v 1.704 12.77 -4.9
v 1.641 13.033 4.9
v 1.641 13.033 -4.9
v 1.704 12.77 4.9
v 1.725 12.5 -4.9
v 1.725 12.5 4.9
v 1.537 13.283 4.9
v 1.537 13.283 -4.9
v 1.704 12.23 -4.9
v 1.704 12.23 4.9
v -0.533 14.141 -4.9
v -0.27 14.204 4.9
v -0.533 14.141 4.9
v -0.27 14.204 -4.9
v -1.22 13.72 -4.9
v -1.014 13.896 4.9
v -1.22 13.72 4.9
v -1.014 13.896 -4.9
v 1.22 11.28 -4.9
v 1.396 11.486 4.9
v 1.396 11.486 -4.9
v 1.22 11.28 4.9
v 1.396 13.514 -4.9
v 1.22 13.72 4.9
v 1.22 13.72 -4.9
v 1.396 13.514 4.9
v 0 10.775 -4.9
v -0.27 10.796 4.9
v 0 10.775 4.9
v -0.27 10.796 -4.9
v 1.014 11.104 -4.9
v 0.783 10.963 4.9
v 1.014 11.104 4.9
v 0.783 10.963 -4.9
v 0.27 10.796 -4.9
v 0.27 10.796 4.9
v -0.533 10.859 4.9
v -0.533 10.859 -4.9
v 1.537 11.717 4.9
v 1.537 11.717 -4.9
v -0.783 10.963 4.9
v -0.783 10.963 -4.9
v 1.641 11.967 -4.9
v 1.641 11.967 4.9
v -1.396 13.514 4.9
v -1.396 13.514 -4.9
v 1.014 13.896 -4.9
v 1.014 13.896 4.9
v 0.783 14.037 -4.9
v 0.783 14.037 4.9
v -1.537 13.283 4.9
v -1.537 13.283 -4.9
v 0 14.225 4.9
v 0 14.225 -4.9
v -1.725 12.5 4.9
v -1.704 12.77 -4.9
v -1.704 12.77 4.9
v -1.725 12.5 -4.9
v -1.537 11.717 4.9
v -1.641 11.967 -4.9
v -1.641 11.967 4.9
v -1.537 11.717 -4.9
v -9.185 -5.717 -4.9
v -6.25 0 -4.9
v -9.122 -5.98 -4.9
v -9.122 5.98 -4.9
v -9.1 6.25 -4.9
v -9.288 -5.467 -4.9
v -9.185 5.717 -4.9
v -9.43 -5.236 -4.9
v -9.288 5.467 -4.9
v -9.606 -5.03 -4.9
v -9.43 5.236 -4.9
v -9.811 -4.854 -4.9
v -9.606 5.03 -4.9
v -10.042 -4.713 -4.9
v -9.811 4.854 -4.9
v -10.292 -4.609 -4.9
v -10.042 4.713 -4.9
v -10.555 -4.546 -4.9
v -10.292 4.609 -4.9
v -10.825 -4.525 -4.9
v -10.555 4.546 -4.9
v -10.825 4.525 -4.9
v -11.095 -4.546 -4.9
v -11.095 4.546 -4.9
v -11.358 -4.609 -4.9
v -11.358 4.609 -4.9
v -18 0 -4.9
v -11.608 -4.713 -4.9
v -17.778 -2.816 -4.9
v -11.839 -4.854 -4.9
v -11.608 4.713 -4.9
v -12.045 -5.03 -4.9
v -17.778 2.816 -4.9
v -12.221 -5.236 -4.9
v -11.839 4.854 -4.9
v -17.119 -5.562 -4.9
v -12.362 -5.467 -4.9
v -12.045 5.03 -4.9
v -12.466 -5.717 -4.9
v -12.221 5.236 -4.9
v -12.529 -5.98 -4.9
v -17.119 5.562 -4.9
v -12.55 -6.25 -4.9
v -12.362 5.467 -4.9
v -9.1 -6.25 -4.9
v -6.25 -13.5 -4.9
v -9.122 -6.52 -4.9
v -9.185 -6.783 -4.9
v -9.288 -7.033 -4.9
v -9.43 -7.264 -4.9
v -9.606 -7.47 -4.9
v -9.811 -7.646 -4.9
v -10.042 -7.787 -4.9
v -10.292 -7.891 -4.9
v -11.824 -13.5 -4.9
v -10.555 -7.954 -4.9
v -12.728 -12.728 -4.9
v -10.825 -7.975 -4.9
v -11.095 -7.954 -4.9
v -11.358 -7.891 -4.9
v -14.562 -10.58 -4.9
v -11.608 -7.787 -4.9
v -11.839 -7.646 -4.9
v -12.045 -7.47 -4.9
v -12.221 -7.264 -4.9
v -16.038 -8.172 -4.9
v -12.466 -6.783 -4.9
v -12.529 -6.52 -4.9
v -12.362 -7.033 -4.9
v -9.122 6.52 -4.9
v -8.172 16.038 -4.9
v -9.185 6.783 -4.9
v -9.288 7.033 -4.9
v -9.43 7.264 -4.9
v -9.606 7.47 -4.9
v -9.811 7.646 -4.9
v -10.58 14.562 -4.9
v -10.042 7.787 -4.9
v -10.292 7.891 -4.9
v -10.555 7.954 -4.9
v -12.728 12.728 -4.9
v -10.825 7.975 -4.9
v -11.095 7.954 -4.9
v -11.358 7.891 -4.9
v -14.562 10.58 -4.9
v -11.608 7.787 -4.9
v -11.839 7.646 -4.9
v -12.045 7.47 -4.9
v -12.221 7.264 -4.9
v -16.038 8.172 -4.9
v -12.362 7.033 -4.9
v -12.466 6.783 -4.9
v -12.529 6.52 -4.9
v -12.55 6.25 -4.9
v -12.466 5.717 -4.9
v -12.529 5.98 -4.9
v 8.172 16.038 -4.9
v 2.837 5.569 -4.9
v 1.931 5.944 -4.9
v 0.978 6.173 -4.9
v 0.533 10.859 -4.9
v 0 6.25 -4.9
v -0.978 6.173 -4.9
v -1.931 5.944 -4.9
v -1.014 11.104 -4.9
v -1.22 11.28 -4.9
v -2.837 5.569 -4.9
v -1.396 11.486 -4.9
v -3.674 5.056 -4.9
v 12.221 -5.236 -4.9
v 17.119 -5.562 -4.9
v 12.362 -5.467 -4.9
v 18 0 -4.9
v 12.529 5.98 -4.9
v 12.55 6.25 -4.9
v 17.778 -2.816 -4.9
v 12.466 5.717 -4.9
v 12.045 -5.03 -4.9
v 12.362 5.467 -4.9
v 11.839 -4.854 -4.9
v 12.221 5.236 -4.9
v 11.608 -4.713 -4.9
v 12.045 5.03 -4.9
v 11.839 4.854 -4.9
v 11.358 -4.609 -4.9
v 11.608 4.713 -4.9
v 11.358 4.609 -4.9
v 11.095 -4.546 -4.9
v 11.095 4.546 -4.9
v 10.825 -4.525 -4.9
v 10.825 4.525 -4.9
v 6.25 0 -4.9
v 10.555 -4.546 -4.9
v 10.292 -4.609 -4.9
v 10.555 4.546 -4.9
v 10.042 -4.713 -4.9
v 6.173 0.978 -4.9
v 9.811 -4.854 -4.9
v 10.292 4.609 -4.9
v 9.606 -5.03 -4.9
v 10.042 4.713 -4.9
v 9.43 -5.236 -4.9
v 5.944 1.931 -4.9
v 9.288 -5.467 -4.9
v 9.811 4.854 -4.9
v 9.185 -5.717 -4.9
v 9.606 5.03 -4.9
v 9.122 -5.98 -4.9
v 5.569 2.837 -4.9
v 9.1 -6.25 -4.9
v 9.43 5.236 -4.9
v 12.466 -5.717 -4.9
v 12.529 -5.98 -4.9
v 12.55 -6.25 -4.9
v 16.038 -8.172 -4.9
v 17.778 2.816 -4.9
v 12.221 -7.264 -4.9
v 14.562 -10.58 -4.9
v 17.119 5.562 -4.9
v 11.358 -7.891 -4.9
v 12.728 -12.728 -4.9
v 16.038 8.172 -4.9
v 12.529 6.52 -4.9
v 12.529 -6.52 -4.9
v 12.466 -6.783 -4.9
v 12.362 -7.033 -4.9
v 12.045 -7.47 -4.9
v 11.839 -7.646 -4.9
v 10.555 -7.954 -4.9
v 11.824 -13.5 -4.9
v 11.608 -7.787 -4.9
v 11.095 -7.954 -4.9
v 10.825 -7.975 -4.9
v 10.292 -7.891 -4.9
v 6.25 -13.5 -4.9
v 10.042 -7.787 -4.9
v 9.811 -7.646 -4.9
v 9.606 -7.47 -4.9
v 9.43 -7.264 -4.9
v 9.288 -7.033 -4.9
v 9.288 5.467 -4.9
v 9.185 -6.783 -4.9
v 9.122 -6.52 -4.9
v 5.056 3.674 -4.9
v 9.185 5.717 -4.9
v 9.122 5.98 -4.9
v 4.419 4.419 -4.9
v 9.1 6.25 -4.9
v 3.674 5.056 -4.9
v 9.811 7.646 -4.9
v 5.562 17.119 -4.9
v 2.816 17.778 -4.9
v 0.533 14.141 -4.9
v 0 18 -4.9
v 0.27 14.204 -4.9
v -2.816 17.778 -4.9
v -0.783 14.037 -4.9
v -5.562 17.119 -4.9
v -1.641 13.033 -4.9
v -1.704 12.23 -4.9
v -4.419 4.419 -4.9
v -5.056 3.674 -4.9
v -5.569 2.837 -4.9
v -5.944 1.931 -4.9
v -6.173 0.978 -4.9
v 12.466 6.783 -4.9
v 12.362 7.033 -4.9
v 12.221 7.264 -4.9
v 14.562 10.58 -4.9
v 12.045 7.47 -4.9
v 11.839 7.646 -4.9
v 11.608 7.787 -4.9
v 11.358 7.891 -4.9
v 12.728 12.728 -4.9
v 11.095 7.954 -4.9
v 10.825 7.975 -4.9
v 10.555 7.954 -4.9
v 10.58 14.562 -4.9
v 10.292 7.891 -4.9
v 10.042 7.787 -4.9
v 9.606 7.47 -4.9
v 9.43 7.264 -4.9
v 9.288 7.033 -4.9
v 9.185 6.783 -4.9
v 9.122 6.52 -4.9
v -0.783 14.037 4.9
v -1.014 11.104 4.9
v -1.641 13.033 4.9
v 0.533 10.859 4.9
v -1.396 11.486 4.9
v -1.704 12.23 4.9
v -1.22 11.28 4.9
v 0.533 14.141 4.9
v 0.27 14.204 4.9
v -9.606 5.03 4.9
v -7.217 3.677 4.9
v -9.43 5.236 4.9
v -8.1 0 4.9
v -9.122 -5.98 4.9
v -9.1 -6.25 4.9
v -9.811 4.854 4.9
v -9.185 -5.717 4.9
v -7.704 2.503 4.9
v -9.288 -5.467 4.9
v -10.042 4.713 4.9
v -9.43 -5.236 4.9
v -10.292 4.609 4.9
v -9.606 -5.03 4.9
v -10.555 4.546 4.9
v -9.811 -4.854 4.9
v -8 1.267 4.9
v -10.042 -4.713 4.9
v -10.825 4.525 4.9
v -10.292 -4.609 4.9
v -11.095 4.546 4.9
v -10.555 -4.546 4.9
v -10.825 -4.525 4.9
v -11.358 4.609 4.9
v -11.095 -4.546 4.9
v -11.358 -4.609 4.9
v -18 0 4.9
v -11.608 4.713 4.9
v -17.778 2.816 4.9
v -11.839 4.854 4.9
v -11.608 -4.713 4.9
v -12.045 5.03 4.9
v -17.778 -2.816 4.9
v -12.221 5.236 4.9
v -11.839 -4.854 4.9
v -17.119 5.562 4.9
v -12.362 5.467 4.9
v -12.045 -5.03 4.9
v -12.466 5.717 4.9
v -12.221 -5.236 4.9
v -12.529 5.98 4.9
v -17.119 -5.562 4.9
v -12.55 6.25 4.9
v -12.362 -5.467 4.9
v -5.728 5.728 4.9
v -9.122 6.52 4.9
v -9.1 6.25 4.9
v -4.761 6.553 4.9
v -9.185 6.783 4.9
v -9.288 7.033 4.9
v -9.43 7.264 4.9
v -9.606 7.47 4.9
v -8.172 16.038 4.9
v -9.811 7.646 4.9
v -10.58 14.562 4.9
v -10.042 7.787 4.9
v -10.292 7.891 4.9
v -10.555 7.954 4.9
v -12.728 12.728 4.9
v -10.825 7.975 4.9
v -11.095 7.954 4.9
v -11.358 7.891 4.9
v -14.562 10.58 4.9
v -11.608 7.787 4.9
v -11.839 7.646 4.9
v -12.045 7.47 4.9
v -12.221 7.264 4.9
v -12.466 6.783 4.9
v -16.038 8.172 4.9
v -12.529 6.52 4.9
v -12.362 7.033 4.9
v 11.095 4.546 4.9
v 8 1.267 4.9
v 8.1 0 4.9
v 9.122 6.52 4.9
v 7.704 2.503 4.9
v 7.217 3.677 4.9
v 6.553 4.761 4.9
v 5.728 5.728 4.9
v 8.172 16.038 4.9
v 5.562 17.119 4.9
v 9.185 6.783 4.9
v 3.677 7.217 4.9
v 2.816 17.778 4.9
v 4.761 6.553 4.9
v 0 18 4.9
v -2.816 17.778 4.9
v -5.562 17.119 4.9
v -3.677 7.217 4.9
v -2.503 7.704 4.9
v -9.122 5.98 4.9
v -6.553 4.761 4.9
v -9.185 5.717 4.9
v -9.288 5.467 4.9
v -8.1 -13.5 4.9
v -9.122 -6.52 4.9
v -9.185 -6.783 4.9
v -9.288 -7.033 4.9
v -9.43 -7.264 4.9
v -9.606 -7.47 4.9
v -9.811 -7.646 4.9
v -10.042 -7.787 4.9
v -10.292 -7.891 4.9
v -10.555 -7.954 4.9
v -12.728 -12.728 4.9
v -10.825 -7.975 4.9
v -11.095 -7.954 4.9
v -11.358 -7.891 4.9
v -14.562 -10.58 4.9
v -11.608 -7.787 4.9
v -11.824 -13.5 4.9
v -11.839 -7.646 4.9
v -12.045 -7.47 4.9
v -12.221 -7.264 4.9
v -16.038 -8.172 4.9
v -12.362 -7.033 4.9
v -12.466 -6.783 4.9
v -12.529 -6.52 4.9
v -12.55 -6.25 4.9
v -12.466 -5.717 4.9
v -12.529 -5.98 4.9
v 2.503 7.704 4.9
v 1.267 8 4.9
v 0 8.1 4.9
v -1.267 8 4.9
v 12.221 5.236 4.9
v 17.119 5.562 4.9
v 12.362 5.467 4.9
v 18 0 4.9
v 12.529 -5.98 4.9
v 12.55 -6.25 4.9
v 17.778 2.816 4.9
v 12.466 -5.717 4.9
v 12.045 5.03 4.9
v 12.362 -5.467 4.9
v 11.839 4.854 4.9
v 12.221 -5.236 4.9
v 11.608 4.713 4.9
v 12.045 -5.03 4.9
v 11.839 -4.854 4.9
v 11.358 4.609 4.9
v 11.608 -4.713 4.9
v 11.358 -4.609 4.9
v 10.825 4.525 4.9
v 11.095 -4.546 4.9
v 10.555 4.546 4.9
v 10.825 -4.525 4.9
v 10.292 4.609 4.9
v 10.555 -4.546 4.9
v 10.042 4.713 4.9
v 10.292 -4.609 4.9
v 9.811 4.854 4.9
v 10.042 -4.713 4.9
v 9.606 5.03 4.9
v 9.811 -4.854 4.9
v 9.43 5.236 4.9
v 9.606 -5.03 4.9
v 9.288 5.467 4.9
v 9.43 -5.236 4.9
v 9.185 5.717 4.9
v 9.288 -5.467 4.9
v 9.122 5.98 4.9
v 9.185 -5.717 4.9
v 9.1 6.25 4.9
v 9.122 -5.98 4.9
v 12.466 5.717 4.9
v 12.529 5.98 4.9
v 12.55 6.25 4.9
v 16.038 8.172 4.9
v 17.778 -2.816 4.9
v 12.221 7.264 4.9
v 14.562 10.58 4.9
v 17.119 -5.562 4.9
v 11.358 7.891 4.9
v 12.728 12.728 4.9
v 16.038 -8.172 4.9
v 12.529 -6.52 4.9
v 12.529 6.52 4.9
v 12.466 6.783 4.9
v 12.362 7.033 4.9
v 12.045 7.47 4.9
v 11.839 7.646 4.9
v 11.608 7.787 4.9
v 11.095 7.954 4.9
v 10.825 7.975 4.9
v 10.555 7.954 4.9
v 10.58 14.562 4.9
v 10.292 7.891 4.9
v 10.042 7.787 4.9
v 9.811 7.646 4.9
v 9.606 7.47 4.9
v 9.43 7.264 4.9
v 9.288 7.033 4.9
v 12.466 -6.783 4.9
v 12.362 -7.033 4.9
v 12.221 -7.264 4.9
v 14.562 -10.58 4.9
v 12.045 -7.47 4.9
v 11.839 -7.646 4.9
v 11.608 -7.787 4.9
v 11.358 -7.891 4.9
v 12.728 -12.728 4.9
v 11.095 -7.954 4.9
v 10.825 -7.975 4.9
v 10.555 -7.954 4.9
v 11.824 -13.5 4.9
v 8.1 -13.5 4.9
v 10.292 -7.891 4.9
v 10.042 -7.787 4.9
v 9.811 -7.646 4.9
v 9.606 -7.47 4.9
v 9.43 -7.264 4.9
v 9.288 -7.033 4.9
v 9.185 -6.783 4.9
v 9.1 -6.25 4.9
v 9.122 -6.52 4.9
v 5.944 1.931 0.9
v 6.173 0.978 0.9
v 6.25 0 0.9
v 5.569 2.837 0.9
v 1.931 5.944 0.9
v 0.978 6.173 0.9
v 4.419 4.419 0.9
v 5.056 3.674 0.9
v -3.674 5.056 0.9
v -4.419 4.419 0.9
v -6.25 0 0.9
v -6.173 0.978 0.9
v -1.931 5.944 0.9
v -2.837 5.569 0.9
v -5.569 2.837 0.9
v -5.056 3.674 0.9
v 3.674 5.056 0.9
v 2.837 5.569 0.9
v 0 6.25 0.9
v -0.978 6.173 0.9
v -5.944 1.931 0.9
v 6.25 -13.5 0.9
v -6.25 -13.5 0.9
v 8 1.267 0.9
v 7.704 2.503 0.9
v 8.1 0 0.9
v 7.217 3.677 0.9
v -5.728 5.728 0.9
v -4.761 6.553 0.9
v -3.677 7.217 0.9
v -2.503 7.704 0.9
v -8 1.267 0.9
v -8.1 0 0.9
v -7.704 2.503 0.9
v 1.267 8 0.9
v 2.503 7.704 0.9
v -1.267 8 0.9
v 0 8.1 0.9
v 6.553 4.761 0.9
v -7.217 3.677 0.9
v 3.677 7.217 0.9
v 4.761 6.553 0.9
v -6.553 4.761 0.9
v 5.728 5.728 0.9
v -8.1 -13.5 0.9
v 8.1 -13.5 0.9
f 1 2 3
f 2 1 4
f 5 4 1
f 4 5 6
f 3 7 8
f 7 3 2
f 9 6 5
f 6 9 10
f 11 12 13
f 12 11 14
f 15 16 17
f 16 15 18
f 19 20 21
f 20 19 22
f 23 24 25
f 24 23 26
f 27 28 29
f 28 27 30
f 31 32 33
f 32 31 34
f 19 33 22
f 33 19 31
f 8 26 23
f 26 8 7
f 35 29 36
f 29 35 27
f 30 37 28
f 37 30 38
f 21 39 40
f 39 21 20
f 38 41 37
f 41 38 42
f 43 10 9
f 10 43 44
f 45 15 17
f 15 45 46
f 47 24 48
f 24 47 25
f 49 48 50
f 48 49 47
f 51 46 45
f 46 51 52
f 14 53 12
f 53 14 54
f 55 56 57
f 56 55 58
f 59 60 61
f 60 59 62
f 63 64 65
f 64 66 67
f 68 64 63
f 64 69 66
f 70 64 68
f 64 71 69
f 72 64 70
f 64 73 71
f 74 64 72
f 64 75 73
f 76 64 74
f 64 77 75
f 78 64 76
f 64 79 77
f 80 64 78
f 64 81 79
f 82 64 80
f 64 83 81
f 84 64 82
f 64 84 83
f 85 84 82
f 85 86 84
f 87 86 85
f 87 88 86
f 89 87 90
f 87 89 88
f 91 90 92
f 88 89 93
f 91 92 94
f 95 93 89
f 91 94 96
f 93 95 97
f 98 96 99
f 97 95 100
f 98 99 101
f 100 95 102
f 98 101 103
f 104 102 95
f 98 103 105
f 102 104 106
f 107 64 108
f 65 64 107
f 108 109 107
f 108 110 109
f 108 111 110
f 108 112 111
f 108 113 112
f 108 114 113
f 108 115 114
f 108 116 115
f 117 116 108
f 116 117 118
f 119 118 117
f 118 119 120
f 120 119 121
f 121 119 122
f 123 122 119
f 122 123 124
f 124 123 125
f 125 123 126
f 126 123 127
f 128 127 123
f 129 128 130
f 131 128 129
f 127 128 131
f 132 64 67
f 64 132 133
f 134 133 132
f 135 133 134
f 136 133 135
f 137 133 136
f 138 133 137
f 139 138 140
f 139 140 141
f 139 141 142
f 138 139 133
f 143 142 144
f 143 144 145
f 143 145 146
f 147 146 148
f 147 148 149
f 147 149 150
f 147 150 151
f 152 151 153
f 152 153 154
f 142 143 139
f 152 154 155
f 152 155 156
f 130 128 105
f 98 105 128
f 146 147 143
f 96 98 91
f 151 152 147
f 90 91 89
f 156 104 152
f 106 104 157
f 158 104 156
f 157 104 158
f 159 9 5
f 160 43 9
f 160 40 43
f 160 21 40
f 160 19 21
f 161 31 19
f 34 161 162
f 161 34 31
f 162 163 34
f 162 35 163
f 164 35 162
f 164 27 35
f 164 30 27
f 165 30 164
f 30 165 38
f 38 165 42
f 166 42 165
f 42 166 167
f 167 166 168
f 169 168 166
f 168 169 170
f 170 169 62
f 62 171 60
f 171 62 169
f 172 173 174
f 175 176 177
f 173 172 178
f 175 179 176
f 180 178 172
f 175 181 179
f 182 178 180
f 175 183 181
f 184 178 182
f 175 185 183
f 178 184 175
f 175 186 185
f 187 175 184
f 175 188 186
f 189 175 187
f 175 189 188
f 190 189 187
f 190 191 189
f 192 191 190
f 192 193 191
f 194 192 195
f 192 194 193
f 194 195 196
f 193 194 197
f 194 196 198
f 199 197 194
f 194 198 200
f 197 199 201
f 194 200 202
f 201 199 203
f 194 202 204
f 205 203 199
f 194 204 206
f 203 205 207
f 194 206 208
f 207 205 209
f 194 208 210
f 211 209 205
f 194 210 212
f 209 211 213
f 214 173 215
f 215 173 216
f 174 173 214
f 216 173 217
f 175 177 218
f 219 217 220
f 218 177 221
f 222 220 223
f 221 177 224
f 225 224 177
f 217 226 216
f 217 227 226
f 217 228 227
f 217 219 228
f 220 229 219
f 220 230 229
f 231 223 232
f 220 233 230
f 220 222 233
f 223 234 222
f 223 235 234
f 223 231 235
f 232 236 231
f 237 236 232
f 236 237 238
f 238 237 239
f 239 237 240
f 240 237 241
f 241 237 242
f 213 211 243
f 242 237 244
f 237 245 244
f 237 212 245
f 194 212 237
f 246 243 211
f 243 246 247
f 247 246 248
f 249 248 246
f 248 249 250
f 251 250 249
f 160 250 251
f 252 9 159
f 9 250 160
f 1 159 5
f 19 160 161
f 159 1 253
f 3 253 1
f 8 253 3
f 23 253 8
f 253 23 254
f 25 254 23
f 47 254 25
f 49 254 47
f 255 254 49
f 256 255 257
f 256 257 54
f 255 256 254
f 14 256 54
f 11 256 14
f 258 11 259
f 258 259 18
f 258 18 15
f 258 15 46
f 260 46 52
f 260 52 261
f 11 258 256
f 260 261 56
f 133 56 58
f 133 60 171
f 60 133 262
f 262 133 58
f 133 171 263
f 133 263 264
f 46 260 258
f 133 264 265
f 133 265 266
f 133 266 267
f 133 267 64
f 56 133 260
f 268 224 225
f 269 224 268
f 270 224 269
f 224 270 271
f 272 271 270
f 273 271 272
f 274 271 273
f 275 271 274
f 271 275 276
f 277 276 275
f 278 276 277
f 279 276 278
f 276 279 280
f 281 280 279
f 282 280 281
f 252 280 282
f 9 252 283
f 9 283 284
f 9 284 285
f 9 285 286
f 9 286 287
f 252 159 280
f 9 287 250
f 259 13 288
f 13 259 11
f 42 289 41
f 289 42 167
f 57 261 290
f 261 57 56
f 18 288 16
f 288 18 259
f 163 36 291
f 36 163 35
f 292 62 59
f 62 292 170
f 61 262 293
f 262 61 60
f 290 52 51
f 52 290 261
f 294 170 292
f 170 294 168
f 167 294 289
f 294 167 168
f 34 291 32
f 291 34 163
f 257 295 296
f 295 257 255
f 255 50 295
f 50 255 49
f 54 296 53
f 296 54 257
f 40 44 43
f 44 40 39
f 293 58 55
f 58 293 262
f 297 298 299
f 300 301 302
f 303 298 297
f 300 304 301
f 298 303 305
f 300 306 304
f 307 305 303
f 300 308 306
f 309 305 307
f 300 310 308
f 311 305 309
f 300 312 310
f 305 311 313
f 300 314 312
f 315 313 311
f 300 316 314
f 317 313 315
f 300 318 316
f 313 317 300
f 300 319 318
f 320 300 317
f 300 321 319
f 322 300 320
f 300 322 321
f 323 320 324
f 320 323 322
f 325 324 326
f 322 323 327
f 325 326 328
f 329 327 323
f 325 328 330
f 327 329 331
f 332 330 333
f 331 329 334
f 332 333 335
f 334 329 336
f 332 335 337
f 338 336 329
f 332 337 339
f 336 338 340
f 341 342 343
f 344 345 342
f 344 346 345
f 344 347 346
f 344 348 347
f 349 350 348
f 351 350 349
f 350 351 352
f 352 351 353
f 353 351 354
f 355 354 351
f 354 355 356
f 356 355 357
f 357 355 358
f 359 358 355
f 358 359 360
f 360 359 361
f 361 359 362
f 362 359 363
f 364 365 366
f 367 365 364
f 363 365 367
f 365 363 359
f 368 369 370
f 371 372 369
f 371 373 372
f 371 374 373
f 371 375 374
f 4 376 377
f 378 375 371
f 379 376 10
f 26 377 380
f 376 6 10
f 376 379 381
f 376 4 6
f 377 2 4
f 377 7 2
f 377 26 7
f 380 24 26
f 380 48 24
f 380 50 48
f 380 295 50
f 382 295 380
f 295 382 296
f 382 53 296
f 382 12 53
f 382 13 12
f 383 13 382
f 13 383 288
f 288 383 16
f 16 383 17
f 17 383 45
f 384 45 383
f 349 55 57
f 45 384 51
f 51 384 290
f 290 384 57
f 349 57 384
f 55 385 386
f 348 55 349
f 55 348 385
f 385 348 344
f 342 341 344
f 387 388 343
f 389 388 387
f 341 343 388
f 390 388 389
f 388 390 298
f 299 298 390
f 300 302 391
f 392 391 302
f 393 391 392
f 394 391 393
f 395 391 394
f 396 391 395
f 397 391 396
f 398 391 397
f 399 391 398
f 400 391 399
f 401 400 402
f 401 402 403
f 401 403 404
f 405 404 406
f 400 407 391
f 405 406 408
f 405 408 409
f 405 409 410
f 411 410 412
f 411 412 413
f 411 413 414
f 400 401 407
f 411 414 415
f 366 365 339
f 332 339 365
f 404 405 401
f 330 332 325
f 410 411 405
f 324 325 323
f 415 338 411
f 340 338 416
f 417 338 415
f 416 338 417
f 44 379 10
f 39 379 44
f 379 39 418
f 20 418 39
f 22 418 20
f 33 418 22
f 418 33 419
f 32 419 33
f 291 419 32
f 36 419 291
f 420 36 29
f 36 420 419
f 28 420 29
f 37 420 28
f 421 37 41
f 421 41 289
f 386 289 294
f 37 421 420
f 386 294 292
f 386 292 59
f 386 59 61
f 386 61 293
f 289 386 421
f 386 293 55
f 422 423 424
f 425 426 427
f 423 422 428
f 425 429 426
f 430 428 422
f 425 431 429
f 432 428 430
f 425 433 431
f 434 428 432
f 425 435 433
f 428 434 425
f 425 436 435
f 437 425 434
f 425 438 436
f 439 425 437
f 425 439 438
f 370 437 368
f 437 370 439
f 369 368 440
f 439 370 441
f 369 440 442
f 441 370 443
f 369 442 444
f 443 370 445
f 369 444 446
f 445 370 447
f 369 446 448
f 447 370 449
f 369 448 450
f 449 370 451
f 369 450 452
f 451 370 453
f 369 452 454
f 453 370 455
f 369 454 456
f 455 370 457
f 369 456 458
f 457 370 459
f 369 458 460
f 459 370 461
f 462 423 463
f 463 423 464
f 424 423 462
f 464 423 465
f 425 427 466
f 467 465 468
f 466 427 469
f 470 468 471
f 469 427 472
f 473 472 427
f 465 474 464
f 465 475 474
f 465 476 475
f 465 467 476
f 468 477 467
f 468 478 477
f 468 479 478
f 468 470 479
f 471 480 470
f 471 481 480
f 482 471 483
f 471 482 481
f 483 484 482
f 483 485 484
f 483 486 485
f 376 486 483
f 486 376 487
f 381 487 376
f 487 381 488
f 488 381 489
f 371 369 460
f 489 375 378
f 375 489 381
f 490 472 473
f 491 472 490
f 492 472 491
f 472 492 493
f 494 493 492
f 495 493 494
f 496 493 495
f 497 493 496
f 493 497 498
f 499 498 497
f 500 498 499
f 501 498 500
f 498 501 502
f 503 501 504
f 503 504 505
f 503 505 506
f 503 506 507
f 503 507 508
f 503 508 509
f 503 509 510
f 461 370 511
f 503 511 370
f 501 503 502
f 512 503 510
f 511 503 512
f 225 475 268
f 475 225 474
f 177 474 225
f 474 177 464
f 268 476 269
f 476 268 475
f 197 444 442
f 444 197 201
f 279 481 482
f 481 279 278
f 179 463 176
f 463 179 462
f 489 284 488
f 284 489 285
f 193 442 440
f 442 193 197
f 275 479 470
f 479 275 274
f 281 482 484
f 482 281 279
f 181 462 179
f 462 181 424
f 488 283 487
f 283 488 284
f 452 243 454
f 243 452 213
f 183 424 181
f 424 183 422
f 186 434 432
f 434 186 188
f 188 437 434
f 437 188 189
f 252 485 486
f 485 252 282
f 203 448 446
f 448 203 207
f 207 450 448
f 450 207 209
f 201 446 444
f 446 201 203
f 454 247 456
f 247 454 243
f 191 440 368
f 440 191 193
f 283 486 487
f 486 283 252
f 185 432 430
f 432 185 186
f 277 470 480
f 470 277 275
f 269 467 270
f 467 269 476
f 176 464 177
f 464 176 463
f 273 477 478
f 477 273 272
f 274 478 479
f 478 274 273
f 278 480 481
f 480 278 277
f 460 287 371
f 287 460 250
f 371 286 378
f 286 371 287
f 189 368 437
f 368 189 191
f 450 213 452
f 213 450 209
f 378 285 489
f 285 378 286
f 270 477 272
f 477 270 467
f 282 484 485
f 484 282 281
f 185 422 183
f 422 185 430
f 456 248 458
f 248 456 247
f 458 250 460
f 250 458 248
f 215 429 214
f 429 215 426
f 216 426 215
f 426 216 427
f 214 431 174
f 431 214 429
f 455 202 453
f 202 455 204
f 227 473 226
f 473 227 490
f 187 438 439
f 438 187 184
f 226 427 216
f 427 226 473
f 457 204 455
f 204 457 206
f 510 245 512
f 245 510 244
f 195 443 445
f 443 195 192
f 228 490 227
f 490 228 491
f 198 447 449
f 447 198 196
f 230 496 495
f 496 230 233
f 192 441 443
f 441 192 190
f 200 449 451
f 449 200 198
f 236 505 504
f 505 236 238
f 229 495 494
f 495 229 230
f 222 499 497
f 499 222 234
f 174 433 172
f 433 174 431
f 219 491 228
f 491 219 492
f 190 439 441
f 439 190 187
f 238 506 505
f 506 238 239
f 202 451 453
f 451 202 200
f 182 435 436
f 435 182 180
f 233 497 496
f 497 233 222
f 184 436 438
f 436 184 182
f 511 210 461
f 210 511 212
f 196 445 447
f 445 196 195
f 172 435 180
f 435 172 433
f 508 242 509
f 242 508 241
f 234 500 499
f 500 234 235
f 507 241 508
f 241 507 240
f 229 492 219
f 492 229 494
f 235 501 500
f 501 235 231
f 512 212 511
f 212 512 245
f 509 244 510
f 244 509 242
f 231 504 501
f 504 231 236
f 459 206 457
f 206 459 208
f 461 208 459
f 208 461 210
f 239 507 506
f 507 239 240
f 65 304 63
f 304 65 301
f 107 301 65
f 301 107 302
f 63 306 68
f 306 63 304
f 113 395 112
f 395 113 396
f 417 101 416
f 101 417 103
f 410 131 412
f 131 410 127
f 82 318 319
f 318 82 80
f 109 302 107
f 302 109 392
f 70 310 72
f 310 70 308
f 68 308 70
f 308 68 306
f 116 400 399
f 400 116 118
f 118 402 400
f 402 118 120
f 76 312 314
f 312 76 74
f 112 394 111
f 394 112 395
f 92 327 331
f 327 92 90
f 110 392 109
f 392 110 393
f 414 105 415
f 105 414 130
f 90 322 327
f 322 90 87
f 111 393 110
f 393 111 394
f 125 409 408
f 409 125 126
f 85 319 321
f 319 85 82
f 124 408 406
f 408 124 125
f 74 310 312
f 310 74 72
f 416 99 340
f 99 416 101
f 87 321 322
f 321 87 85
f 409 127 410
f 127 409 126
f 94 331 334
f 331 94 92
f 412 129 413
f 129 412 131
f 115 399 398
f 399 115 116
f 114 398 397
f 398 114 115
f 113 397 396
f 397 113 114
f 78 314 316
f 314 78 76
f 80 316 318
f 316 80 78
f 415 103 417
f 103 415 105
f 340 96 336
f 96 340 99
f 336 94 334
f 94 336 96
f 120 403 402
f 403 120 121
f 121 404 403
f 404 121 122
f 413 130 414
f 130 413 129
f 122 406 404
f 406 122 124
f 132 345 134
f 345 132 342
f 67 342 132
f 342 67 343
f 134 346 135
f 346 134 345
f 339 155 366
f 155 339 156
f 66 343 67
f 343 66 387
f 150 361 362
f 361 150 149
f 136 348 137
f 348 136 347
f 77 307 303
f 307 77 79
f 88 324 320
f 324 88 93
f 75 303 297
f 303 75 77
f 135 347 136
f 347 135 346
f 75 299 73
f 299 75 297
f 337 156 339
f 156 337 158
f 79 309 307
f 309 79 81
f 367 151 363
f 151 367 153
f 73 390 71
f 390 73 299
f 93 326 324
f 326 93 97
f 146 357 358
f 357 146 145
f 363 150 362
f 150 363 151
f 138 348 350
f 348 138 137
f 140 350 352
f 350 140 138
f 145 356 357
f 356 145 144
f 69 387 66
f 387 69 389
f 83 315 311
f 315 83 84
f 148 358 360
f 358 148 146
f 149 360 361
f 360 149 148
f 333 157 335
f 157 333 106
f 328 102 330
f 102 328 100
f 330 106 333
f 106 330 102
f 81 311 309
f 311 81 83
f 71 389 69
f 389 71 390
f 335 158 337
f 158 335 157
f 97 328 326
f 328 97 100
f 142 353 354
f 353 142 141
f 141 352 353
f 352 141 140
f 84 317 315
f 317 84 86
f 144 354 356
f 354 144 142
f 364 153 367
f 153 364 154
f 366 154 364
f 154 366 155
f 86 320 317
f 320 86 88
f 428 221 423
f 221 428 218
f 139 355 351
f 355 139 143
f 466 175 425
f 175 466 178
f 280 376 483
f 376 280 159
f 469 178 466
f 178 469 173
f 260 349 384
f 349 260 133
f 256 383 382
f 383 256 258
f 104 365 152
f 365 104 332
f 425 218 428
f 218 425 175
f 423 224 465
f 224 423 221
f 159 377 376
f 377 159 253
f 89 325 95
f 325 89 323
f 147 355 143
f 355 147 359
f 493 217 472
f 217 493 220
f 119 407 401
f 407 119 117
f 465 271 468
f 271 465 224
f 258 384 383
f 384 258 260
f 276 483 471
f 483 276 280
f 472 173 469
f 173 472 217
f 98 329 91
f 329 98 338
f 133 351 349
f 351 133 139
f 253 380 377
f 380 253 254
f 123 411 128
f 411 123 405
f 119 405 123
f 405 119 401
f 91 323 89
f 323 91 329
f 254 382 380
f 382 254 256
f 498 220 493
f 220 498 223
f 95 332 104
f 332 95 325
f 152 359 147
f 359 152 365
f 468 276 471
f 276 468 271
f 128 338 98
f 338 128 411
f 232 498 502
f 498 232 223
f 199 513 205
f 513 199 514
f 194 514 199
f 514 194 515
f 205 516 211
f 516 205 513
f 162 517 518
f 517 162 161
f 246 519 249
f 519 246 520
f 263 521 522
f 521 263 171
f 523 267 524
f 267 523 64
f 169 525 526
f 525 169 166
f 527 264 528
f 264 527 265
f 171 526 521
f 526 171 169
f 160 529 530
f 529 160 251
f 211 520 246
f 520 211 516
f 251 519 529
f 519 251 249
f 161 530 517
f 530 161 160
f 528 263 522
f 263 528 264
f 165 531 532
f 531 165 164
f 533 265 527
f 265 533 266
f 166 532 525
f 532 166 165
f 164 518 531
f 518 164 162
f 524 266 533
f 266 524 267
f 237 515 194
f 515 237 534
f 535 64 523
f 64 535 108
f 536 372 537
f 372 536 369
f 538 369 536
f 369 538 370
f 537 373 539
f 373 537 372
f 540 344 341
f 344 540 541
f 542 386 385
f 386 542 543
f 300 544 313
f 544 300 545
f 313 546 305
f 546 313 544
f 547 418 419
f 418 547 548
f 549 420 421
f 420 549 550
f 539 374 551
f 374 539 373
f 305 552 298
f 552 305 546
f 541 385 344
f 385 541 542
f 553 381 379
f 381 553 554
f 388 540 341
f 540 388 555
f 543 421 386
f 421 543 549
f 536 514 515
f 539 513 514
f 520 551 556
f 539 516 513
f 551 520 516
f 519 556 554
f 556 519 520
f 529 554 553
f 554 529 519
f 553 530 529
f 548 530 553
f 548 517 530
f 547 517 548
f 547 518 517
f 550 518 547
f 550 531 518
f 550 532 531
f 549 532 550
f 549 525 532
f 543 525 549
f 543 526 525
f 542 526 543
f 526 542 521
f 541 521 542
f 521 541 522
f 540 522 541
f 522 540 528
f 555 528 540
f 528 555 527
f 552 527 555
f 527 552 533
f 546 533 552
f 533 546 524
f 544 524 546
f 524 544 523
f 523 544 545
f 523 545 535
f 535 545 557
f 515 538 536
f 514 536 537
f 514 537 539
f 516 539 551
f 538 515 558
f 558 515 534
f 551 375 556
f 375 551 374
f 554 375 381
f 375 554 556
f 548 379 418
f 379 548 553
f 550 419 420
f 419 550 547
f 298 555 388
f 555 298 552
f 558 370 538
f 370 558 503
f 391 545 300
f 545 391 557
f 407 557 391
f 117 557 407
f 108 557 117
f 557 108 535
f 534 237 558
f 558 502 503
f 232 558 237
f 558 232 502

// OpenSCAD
// file: configuration.scad
// Increase this if your slicer or printer make holes too tight.
extra_radius = 0.1;

// OD = outside diameter, corner to corner.
m3_nut_od = 6.1;
m3_nut_radius = m3_nut_od/2 + 0.2 + extra_radius;
m3_washer_radius = 3.5 + extra_radius;

// Major diameter of metric 3mm thread.
m3_major = 2.85;
m3_radius = m3_major/2 + extra_radius;
m3_wide_radius = m3_major/2 + extra_radius + 0.2;

// NEMA17 stepper motors.
motor_shaft_diameter = 5;
motor_shaft_radius = motor_shaft_diameter/2 + extra_radius;

// Frame brackets. M3x8mm screws work best with 3.6 mm brackets.
thickness = 3.6;

// OpenBeam or Misumi. Currently only 15x15 mm, but there is a plan
// to make models more parametric and allow 20x20 mm in the future.
extrusion = 20;

extrusion_channel_w = 5; //use 3 for 1515
extrusion_channel_d = 3; //use 3 for 1515
extrusion_fin_d = 1;

vertex_radius = 40.5; //set to 36 for 1515
vertex_x_offset = 7.25; // offset of the horizontal extrusion to the vertical one in X axis
vertex_y_offset = 39 ;//27; // offset of the horizontal extrusion to the vertical one in Y axis

// Placement for the NEMA17 stepper motors.
motor_offset = 44;
motor_length = 47;
// main file
include <configuration.scad>;

// Overall mount dimensions
mount_radius = 18;
//for e3d v6
mount_thickness = 9.8;

// Through holes
hole_radius = 12.5;

// Slot and lip for installation
slot_radius = 6.25;
lip_radius = 8.1;
lip_thickness = 4; //for e3d v6

$fn = 40;

difference() {
  cylinder(r=mount_radius, h=mount_thickness, center=true);

  // Thru holes
  for (hole_angle = [0:60:360]) {
    translate([sin(hole_angle)*hole_radius,cos(hole_angle)*hole_radius,0]) cylinder(r=m3_wide_radius, h=mount_thickness, center=true);
  }

  // Thru slot
  cylinder(r=slot_radius, h=mount_thickness, center=true);
  translate([0, -mount_radius/2, 0]) cube([2*slot_radius, mount_radius, mount_thickness], center=true);

  // Lip 
  translate([0, 0, (mount_thickness-lip_thickness)/2]) cylinder(r=lip_radius, h=lip_thickness, center=true);
  translate([0, -mount_radius/2, (mount_thickness-lip_thickness)/2]) cube([2*lip_radius, mount_radius, lip_thickness], center=true);

  // Cut off the sharp edges at the front
  translate([0, -7/4*mount_radius, 0]) cube([2*mount_radius, 2*mount_radius, mount_thickness], center=true);
};
